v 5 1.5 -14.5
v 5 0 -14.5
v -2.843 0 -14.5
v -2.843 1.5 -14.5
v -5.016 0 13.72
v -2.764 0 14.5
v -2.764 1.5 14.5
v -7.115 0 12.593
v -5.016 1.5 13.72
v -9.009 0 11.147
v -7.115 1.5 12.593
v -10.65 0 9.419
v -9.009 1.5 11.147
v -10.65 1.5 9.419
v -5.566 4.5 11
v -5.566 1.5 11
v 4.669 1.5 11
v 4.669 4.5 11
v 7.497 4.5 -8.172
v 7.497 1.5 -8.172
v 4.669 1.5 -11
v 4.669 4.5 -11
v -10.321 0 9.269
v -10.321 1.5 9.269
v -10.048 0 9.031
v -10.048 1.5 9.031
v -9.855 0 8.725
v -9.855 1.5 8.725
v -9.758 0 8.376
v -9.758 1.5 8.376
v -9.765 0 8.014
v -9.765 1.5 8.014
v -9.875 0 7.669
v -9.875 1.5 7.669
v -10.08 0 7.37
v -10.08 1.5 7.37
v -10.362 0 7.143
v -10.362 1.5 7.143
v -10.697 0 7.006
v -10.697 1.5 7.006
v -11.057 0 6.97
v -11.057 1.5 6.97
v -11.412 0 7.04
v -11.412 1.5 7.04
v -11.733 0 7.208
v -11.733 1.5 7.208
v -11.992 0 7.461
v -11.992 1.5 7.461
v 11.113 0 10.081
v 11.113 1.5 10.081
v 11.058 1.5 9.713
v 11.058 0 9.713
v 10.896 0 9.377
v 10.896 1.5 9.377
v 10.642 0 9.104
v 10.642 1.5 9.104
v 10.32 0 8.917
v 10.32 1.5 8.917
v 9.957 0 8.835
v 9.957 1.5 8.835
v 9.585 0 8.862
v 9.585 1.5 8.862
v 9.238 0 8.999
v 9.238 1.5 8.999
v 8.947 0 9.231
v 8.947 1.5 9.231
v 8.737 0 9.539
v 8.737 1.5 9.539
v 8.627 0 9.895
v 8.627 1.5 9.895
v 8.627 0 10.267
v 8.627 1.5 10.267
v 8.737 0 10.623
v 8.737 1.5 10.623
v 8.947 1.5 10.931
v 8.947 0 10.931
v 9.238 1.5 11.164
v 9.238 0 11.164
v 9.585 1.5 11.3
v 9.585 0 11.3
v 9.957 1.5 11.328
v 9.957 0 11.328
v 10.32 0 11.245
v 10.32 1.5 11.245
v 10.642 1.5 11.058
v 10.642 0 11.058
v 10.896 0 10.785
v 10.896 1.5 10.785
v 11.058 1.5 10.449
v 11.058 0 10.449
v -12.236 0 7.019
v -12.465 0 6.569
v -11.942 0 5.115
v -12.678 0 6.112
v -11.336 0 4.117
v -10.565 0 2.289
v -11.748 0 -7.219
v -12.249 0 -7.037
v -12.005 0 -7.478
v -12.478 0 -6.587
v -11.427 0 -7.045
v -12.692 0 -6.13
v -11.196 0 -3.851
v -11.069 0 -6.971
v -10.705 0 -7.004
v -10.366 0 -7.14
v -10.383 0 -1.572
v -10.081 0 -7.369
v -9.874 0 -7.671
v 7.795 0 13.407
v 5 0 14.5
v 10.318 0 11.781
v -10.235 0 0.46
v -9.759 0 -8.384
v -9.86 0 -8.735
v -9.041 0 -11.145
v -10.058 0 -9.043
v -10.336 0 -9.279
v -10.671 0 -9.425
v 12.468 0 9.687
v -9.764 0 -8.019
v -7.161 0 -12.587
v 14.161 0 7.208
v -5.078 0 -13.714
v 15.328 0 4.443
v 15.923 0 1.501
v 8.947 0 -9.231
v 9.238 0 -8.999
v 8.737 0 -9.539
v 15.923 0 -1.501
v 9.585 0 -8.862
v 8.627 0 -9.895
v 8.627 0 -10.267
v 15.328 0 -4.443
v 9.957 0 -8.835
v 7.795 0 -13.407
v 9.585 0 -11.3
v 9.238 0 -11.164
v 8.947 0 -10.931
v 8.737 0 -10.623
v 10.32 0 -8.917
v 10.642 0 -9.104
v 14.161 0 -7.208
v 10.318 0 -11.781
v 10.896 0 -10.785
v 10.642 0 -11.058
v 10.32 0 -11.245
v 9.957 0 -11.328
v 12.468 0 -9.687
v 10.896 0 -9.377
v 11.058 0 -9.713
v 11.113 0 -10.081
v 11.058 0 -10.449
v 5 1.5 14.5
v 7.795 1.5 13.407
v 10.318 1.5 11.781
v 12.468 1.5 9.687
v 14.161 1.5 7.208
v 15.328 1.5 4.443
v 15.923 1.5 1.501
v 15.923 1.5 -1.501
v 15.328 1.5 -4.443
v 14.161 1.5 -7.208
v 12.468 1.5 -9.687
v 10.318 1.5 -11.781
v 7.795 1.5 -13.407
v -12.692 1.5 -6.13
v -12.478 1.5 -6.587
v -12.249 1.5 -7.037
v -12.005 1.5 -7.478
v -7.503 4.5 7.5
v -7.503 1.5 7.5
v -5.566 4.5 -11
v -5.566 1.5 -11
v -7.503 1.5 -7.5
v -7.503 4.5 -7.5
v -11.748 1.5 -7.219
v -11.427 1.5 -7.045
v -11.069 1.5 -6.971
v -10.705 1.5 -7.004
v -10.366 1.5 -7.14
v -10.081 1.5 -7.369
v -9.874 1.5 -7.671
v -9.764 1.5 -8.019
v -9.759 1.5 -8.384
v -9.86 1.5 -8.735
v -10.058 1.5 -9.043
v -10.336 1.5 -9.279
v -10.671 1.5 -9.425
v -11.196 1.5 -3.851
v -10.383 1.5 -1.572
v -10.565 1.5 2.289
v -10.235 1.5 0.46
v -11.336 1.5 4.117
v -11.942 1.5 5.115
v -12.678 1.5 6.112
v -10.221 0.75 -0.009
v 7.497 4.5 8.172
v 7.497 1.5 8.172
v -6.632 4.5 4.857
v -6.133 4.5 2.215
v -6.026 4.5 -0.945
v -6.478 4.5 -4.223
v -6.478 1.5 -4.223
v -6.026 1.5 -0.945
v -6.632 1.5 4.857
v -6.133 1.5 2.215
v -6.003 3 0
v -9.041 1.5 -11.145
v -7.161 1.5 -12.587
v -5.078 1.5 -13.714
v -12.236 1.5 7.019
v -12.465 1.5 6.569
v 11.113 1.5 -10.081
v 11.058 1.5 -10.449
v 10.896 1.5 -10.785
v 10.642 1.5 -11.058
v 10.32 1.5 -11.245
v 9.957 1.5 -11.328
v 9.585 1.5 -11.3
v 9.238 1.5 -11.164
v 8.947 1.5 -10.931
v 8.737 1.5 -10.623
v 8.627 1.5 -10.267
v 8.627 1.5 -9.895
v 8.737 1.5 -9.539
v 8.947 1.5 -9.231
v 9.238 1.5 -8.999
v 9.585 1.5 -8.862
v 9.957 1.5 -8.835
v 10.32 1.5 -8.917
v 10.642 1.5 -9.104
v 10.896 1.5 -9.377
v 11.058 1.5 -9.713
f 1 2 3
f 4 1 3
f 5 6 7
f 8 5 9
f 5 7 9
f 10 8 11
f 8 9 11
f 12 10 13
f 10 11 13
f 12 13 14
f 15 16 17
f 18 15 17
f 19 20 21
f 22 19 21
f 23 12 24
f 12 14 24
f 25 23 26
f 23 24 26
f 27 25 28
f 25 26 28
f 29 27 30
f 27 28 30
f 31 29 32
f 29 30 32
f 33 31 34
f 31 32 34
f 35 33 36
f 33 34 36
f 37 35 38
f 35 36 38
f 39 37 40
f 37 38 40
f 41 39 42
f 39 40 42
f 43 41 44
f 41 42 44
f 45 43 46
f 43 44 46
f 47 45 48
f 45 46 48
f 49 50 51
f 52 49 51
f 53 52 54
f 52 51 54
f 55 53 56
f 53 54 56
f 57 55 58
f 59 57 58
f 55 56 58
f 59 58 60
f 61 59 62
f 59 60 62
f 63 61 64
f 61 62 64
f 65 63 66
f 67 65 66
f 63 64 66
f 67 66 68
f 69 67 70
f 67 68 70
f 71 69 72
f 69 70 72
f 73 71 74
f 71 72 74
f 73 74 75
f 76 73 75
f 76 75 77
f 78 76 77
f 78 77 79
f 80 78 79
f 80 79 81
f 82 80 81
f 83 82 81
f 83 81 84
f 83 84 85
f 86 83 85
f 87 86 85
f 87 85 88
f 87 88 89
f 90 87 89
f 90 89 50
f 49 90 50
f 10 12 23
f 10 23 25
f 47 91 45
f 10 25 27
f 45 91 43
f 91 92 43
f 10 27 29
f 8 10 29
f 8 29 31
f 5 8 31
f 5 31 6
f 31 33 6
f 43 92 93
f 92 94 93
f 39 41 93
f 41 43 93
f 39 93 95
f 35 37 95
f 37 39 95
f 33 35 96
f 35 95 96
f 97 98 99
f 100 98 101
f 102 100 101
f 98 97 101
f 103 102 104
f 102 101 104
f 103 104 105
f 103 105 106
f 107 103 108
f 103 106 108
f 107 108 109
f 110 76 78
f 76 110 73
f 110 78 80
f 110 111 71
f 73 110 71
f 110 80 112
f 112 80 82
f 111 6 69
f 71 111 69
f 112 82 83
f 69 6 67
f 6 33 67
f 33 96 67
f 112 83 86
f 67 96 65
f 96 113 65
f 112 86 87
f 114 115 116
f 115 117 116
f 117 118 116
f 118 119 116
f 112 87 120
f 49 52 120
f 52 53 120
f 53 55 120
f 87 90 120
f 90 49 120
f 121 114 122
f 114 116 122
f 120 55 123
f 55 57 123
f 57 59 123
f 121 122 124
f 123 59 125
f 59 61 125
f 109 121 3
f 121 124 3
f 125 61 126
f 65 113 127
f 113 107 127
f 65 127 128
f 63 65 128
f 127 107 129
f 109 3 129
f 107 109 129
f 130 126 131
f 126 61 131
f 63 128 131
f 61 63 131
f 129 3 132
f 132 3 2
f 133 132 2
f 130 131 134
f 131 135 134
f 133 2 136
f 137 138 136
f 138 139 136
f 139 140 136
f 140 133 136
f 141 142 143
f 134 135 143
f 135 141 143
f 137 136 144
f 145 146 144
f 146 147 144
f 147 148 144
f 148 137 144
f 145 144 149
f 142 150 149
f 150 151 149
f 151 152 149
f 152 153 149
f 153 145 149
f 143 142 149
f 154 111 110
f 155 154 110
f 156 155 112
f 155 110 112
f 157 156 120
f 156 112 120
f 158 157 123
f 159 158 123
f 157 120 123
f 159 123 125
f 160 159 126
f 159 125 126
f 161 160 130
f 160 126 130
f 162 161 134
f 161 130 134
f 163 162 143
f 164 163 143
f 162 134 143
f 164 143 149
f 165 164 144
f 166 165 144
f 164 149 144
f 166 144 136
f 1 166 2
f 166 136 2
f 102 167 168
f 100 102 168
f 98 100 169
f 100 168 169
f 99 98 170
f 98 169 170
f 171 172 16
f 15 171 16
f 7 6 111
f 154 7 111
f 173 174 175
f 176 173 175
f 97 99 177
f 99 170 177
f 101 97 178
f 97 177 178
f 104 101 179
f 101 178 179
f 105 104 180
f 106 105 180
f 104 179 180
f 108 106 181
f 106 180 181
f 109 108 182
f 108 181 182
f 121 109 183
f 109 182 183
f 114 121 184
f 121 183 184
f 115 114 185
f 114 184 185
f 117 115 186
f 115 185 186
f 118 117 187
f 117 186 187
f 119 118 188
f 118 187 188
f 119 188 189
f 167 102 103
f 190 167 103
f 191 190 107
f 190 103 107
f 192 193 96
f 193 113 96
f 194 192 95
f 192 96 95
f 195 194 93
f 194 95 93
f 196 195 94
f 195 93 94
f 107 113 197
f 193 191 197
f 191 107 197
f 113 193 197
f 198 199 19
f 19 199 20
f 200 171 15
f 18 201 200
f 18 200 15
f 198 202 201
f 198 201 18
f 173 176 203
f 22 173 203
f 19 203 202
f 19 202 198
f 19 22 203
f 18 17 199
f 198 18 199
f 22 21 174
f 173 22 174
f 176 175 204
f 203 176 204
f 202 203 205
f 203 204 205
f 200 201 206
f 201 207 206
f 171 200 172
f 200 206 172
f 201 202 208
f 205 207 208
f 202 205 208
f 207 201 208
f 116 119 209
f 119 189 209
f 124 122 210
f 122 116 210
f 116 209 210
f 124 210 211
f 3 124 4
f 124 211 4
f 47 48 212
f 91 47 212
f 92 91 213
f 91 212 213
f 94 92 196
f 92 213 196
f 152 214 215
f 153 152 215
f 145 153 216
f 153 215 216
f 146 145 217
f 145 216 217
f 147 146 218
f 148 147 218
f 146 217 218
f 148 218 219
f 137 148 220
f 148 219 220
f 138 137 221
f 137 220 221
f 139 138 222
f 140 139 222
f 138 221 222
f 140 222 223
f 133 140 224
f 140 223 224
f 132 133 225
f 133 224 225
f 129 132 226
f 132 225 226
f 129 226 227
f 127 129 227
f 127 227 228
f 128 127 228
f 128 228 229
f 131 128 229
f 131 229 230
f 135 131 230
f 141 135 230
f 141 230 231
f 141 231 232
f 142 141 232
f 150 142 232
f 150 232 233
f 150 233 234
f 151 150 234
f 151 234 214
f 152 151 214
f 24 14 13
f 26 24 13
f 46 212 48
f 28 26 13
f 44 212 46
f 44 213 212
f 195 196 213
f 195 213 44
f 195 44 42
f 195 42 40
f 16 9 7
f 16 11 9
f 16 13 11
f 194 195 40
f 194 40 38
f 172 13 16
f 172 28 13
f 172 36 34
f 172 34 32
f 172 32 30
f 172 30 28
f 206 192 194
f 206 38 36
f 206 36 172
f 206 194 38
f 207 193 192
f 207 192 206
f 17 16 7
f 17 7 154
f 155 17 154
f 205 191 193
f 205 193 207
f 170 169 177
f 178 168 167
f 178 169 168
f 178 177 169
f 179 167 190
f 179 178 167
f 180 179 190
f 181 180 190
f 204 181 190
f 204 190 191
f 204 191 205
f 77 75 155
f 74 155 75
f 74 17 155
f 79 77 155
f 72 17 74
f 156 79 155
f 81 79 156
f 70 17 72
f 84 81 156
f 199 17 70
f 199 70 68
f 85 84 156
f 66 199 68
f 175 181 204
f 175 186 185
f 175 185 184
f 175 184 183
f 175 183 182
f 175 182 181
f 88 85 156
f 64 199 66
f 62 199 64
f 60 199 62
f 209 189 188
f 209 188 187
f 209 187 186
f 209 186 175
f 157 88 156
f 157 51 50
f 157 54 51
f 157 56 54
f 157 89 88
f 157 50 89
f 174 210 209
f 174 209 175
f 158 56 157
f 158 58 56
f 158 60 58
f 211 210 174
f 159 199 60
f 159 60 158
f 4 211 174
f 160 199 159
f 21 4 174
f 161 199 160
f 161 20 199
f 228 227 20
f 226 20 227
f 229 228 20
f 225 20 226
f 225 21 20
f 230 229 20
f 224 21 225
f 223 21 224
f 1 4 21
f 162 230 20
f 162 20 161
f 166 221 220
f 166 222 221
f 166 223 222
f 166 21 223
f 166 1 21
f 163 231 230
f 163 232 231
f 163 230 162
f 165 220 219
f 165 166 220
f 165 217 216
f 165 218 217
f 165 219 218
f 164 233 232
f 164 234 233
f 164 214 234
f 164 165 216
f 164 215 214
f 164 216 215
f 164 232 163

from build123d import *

# Parameters (mm, degrees)
EXTRUDE_1_DEPTH     = 1.5
EXTRUDE_2_DEPTH     = 3
SKETCH_5_R          = 1.25
CUT_EXTRUDE_2_DEPTH = 2.5000001
CUT_EXTRUDE_3_DEPTH = 2.5000001


with BuildPart() as part:
    # Эскиз1 → Бобышка-Вытянуть1 (new body)
    with BuildSketch(Plane(origin=(0, 0, 0), x_dir=(1, 0, 0), z_dir=(0, 1, 0))):
        with BuildLine():
            Line((5, 14.5), (-5, 14.5))
            ThreePointArc((-5, 14.5), (-9.453000697, 12.420644275), (-13, 9.018919508))
            Line((-13, 9.018919508), (-13, 6.5))
            add(Edge.make_bspline(
                [(-13, 6.5), (-7.441418368, 0), (-13, -6.5)],
                knots=[0, 0, 0, 1, 1, 1], degree=2))
            Line((-13, -6.5), (-13, -9.018919508))
            ThreePointArc((-13, -9.018919508), (-9.453000697, -12.420644275), (-5, -14.5))
            Line((-5, -14.5), (5, -14.5))
            ThreePointArc((5, -14.5), (15.997963501, 0), (5, 14.5))
        make_face()
    extrude(amount=EXTRUDE_1_DEPTH)

    # Эскиз3 → Бобышка-Вытянуть2 (add)
    with BuildSketch(Plane(origin=(0, 1.5, 0), x_dir=(1, 0, 0), z_dir=(0, 1, 0))):
        with BuildLine():
            Line((4.668952027, -11), (7.497379152, -8.171572875))
            Line((7.497379152, -8.171572875), (7.497379152, 8.171572875))
            Line((7.497379152, 8.171572875), (4.668952027, 11))
            Line((4.668952027, 11), (-5.566129175, 11))
            Line((-5.566129175, 11), (-7.502620848, 7.5))
            add(Edge.make_bspline(
                [(-7.502620848, 7.5), (-4.502620848, 0), (-7.502620848, -7.5)],
                knots=[0, 0, 0, 1, 1, 1], degree=2))
            Line((-7.502620848, -7.5), (-5.566129175, -11))
            Line((-5.566129175, -11), (4.668952027, -11))
        make_face()
    extrude(amount=EXTRUDE_2_DEPTH)

    # Эскиз5 → Вырез-Вытянуть2 (cut, through all)
    with BuildSketch(Plane(origin=(0, 1.5, 0), x_dir=(1, 0, 0), z_dir=(0, 1, 0))):
        with Locations((9.863113254, 10.081034519)):
            Circle(SKETCH_5_R)
        with Locations((-10.997789514, 8.218757238)):
            Circle(SKETCH_5_R)
        with Locations((9.863113254, -10.081034519)):
            Circle(SKETCH_5_R)
        with Locations((-10.997789514, -8.218757238)):
            Circle(SKETCH_5_R)
    extrude(amount=-CUT_EXTRUDE_2_DEPTH, mode=Mode.SUBTRACT)

    # Эскиз7 → Вырез-Вытянуть3 (cut, through all)
    with BuildSketch(Plane(origin=(0, 1.5, 0), x_dir=(1, 0, 0), z_dir=(0, 1, 0))):
        with BuildLine():
            Line((-13, 9.018919508), (-13, 6.5))
            Line((-13, 6.5), (-12.715649732, 6.077566297))
            ThreePointArc((-12.715649732, 6.077566297), (-8.737112762, 11.411761045), (-2.842609373, 14.5))
            Line((-2.842609373, 14.5), (-5, 14.5))
            ThreePointArc((-5, 14.5), (-9.453000697, 12.420644275), (-13, 9.018919508))
        make_face()
        with BuildLine():
            Line((-13, -6.5), (-13, -9.018919508))
            ThreePointArc((-13, -9.018919508), (-9.453000697, -12.420644275), (-5, -14.5))
            Line((-5, -14.5), (-2.763931787, -14.5))
            ThreePointArc((-2.763931787, -14.5), (-8.693434445, -11.422725682), (-12.695530111, -6.07372117))
            Line((-12.695530111, -6.07372117), (-13, -6.5))
        make_face()
    extrude(amount=-CUT_EXTRUDE_3_DEPTH, mode=Mode.SUBTRACT)


solid = part.part
